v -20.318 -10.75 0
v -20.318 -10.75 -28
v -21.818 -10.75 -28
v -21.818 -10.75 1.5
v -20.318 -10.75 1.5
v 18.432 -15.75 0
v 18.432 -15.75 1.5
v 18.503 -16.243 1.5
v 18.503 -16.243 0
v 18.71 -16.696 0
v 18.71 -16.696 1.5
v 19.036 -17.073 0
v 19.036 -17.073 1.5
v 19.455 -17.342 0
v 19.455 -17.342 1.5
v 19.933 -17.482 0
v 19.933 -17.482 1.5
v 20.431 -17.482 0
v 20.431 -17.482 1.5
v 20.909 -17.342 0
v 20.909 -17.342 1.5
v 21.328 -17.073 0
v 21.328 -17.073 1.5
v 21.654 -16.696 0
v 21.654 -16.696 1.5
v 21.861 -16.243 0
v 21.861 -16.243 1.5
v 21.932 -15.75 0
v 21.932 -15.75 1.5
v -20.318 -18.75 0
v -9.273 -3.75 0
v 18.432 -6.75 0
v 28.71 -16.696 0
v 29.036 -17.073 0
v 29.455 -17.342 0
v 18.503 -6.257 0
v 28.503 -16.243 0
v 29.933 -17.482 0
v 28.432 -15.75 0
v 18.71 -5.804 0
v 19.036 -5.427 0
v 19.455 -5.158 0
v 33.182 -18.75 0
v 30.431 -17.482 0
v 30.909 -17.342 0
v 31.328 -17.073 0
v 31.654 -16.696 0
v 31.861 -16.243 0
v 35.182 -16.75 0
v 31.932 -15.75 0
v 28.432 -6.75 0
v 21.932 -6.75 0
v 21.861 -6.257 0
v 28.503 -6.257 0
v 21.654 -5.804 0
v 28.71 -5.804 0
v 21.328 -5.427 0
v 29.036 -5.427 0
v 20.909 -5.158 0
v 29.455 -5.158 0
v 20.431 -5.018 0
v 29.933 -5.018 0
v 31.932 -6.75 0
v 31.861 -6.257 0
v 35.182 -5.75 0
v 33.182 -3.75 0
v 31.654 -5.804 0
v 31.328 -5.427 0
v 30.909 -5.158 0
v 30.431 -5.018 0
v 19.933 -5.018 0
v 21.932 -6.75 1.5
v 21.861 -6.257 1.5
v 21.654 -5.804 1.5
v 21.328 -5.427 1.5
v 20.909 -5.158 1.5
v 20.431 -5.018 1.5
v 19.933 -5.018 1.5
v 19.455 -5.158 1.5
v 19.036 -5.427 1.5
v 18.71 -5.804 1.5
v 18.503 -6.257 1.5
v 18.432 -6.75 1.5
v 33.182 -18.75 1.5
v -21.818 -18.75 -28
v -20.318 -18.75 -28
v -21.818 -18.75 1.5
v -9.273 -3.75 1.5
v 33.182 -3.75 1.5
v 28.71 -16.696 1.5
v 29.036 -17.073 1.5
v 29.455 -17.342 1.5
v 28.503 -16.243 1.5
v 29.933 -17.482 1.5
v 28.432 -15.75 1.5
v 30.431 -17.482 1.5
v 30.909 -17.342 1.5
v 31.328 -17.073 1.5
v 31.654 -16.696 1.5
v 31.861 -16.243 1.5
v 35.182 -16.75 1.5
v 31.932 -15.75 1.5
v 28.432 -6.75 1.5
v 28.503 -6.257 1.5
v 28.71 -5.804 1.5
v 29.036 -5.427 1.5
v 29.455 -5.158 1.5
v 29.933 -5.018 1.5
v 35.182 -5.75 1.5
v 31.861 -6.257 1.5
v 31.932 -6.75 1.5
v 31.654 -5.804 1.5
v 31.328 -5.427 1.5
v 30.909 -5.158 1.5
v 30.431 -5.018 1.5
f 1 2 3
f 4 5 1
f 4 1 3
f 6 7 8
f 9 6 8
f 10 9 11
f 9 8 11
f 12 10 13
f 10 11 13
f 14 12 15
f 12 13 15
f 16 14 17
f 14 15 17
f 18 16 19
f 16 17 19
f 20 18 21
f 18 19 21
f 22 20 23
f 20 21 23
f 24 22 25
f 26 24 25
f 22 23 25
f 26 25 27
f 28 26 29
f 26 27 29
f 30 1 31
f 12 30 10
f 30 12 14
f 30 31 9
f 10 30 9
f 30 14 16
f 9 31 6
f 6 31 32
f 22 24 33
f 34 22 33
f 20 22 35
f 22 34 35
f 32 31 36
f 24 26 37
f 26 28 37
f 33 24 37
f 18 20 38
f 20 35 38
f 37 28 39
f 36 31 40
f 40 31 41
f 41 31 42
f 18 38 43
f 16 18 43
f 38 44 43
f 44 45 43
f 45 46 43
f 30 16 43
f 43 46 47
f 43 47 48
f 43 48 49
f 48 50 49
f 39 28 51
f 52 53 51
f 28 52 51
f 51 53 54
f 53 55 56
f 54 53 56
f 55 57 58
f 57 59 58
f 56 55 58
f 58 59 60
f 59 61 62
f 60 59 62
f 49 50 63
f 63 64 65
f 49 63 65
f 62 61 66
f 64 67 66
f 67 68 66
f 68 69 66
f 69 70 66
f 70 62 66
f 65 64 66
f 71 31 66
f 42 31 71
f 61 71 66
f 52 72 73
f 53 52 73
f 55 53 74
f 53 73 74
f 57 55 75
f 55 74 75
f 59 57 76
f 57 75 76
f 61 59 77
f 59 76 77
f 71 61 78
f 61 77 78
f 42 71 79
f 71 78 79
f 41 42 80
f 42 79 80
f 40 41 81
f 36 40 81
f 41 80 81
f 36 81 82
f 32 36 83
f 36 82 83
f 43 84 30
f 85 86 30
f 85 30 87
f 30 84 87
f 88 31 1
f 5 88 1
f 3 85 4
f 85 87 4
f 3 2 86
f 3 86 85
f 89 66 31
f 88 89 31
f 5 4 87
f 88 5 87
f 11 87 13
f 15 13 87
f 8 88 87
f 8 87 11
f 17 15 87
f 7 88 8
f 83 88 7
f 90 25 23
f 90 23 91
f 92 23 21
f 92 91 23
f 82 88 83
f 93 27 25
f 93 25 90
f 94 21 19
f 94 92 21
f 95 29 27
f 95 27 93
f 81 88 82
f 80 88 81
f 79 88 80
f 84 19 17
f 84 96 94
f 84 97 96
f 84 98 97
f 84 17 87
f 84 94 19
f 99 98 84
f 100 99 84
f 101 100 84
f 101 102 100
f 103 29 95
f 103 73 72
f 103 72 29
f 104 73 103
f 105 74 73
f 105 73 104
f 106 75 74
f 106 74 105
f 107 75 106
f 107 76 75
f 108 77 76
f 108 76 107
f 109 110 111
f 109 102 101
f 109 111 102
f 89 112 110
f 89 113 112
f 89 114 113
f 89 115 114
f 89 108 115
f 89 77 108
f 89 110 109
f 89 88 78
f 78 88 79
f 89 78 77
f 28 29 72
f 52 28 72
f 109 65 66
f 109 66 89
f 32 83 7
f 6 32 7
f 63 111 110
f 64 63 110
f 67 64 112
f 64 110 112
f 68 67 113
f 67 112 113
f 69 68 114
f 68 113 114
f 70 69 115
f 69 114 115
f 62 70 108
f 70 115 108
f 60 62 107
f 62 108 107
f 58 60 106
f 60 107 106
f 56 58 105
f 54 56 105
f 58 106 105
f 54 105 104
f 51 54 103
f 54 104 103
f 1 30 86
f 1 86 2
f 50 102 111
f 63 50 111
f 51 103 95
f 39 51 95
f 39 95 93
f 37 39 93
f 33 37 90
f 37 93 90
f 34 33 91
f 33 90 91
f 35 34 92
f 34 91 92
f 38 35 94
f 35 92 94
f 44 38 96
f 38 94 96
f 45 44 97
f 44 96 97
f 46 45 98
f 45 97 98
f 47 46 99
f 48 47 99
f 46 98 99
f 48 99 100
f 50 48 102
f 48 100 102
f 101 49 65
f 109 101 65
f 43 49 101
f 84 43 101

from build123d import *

# Parameters (mm, degrees)
BOSS_EXTRUDE2_DEPTH = 1.5
SKETCH5_W           = 1.5
SKETCH5_H           = 8
BOSS_EXTRUDE3_DEPTH = 28
CUT_EXTRUDE1_DEPTH  = 28
CHAMFER1_SIZE       = 2


with BuildPart() as part:
    # Sketch4 → Boss-Extrude2 (new body)
    with BuildSketch(Plane.XY):
        Polygon((-21.818181818, -18.75), (35.181818182, -18.75), (35.181818182, -3.75), (-9.272727273, -3.75), (-20.318181818, -10.75), (-21.818181818, -10.75), align=None)
    extrude(amount=BOSS_EXTRUDE2_DEPTH)

    # Sketch5 → Boss-Extrude3 (add)
    with BuildSketch(Plane(origin=(0, 0, 0), x_dir=(-1, 0, 0), z_dir=(0, 0, -1))):
        with Locations((21.068181818, -14.75)):
            Rectangle(SKETCH5_W, SKETCH5_H)
    extrude(amount=BOSS_EXTRUDE3_DEPTH)

    # Sketch6 → Cut-Extrude1 (cut)
    with BuildSketch(Plane.XY.offset(1.5)):
        with BuildLine():
            Line((18.431818182, -6.75), (18.431818182, -15.75))
            ThreePointArc((18.431818182, -15.75), (20.181818182, -17.5), (21.931818182, -15.75))
            Line((21.931818182, -15.75), (21.931818182, -6.75))
            ThreePointArc((21.931818182, -6.75), (20.181818182, -5), (18.431818182, -6.75))
        make_face()
        with BuildLine():
            Line((28.431818182, -6.75), (28.431818182, -15.75))
            ThreePointArc((28.431818182, -15.75), (30.181818182, -17.5), (31.931818182, -15.75))
            Line((31.931818182, -15.75), (31.931818182, -6.75))
            ThreePointArc((31.931818182, -6.75), (30.181818182, -5), (28.431818182, -6.75))
        make_face()
    extrude(amount=-CUT_EXTRUDE1_DEPTH, mode=Mode.SUBTRACT)

    # Chamfer1
    chamfer1_edges = [part.edges().sort_by_distance(p)[0] for p in [
        (35.181818182, -3.75, 0.75),
        (35.181818182, -18.75, 0.75),
    ]]
    chamfer(chamfer1_edges, length=CHAMFER1_SIZE)


solid = part.part
